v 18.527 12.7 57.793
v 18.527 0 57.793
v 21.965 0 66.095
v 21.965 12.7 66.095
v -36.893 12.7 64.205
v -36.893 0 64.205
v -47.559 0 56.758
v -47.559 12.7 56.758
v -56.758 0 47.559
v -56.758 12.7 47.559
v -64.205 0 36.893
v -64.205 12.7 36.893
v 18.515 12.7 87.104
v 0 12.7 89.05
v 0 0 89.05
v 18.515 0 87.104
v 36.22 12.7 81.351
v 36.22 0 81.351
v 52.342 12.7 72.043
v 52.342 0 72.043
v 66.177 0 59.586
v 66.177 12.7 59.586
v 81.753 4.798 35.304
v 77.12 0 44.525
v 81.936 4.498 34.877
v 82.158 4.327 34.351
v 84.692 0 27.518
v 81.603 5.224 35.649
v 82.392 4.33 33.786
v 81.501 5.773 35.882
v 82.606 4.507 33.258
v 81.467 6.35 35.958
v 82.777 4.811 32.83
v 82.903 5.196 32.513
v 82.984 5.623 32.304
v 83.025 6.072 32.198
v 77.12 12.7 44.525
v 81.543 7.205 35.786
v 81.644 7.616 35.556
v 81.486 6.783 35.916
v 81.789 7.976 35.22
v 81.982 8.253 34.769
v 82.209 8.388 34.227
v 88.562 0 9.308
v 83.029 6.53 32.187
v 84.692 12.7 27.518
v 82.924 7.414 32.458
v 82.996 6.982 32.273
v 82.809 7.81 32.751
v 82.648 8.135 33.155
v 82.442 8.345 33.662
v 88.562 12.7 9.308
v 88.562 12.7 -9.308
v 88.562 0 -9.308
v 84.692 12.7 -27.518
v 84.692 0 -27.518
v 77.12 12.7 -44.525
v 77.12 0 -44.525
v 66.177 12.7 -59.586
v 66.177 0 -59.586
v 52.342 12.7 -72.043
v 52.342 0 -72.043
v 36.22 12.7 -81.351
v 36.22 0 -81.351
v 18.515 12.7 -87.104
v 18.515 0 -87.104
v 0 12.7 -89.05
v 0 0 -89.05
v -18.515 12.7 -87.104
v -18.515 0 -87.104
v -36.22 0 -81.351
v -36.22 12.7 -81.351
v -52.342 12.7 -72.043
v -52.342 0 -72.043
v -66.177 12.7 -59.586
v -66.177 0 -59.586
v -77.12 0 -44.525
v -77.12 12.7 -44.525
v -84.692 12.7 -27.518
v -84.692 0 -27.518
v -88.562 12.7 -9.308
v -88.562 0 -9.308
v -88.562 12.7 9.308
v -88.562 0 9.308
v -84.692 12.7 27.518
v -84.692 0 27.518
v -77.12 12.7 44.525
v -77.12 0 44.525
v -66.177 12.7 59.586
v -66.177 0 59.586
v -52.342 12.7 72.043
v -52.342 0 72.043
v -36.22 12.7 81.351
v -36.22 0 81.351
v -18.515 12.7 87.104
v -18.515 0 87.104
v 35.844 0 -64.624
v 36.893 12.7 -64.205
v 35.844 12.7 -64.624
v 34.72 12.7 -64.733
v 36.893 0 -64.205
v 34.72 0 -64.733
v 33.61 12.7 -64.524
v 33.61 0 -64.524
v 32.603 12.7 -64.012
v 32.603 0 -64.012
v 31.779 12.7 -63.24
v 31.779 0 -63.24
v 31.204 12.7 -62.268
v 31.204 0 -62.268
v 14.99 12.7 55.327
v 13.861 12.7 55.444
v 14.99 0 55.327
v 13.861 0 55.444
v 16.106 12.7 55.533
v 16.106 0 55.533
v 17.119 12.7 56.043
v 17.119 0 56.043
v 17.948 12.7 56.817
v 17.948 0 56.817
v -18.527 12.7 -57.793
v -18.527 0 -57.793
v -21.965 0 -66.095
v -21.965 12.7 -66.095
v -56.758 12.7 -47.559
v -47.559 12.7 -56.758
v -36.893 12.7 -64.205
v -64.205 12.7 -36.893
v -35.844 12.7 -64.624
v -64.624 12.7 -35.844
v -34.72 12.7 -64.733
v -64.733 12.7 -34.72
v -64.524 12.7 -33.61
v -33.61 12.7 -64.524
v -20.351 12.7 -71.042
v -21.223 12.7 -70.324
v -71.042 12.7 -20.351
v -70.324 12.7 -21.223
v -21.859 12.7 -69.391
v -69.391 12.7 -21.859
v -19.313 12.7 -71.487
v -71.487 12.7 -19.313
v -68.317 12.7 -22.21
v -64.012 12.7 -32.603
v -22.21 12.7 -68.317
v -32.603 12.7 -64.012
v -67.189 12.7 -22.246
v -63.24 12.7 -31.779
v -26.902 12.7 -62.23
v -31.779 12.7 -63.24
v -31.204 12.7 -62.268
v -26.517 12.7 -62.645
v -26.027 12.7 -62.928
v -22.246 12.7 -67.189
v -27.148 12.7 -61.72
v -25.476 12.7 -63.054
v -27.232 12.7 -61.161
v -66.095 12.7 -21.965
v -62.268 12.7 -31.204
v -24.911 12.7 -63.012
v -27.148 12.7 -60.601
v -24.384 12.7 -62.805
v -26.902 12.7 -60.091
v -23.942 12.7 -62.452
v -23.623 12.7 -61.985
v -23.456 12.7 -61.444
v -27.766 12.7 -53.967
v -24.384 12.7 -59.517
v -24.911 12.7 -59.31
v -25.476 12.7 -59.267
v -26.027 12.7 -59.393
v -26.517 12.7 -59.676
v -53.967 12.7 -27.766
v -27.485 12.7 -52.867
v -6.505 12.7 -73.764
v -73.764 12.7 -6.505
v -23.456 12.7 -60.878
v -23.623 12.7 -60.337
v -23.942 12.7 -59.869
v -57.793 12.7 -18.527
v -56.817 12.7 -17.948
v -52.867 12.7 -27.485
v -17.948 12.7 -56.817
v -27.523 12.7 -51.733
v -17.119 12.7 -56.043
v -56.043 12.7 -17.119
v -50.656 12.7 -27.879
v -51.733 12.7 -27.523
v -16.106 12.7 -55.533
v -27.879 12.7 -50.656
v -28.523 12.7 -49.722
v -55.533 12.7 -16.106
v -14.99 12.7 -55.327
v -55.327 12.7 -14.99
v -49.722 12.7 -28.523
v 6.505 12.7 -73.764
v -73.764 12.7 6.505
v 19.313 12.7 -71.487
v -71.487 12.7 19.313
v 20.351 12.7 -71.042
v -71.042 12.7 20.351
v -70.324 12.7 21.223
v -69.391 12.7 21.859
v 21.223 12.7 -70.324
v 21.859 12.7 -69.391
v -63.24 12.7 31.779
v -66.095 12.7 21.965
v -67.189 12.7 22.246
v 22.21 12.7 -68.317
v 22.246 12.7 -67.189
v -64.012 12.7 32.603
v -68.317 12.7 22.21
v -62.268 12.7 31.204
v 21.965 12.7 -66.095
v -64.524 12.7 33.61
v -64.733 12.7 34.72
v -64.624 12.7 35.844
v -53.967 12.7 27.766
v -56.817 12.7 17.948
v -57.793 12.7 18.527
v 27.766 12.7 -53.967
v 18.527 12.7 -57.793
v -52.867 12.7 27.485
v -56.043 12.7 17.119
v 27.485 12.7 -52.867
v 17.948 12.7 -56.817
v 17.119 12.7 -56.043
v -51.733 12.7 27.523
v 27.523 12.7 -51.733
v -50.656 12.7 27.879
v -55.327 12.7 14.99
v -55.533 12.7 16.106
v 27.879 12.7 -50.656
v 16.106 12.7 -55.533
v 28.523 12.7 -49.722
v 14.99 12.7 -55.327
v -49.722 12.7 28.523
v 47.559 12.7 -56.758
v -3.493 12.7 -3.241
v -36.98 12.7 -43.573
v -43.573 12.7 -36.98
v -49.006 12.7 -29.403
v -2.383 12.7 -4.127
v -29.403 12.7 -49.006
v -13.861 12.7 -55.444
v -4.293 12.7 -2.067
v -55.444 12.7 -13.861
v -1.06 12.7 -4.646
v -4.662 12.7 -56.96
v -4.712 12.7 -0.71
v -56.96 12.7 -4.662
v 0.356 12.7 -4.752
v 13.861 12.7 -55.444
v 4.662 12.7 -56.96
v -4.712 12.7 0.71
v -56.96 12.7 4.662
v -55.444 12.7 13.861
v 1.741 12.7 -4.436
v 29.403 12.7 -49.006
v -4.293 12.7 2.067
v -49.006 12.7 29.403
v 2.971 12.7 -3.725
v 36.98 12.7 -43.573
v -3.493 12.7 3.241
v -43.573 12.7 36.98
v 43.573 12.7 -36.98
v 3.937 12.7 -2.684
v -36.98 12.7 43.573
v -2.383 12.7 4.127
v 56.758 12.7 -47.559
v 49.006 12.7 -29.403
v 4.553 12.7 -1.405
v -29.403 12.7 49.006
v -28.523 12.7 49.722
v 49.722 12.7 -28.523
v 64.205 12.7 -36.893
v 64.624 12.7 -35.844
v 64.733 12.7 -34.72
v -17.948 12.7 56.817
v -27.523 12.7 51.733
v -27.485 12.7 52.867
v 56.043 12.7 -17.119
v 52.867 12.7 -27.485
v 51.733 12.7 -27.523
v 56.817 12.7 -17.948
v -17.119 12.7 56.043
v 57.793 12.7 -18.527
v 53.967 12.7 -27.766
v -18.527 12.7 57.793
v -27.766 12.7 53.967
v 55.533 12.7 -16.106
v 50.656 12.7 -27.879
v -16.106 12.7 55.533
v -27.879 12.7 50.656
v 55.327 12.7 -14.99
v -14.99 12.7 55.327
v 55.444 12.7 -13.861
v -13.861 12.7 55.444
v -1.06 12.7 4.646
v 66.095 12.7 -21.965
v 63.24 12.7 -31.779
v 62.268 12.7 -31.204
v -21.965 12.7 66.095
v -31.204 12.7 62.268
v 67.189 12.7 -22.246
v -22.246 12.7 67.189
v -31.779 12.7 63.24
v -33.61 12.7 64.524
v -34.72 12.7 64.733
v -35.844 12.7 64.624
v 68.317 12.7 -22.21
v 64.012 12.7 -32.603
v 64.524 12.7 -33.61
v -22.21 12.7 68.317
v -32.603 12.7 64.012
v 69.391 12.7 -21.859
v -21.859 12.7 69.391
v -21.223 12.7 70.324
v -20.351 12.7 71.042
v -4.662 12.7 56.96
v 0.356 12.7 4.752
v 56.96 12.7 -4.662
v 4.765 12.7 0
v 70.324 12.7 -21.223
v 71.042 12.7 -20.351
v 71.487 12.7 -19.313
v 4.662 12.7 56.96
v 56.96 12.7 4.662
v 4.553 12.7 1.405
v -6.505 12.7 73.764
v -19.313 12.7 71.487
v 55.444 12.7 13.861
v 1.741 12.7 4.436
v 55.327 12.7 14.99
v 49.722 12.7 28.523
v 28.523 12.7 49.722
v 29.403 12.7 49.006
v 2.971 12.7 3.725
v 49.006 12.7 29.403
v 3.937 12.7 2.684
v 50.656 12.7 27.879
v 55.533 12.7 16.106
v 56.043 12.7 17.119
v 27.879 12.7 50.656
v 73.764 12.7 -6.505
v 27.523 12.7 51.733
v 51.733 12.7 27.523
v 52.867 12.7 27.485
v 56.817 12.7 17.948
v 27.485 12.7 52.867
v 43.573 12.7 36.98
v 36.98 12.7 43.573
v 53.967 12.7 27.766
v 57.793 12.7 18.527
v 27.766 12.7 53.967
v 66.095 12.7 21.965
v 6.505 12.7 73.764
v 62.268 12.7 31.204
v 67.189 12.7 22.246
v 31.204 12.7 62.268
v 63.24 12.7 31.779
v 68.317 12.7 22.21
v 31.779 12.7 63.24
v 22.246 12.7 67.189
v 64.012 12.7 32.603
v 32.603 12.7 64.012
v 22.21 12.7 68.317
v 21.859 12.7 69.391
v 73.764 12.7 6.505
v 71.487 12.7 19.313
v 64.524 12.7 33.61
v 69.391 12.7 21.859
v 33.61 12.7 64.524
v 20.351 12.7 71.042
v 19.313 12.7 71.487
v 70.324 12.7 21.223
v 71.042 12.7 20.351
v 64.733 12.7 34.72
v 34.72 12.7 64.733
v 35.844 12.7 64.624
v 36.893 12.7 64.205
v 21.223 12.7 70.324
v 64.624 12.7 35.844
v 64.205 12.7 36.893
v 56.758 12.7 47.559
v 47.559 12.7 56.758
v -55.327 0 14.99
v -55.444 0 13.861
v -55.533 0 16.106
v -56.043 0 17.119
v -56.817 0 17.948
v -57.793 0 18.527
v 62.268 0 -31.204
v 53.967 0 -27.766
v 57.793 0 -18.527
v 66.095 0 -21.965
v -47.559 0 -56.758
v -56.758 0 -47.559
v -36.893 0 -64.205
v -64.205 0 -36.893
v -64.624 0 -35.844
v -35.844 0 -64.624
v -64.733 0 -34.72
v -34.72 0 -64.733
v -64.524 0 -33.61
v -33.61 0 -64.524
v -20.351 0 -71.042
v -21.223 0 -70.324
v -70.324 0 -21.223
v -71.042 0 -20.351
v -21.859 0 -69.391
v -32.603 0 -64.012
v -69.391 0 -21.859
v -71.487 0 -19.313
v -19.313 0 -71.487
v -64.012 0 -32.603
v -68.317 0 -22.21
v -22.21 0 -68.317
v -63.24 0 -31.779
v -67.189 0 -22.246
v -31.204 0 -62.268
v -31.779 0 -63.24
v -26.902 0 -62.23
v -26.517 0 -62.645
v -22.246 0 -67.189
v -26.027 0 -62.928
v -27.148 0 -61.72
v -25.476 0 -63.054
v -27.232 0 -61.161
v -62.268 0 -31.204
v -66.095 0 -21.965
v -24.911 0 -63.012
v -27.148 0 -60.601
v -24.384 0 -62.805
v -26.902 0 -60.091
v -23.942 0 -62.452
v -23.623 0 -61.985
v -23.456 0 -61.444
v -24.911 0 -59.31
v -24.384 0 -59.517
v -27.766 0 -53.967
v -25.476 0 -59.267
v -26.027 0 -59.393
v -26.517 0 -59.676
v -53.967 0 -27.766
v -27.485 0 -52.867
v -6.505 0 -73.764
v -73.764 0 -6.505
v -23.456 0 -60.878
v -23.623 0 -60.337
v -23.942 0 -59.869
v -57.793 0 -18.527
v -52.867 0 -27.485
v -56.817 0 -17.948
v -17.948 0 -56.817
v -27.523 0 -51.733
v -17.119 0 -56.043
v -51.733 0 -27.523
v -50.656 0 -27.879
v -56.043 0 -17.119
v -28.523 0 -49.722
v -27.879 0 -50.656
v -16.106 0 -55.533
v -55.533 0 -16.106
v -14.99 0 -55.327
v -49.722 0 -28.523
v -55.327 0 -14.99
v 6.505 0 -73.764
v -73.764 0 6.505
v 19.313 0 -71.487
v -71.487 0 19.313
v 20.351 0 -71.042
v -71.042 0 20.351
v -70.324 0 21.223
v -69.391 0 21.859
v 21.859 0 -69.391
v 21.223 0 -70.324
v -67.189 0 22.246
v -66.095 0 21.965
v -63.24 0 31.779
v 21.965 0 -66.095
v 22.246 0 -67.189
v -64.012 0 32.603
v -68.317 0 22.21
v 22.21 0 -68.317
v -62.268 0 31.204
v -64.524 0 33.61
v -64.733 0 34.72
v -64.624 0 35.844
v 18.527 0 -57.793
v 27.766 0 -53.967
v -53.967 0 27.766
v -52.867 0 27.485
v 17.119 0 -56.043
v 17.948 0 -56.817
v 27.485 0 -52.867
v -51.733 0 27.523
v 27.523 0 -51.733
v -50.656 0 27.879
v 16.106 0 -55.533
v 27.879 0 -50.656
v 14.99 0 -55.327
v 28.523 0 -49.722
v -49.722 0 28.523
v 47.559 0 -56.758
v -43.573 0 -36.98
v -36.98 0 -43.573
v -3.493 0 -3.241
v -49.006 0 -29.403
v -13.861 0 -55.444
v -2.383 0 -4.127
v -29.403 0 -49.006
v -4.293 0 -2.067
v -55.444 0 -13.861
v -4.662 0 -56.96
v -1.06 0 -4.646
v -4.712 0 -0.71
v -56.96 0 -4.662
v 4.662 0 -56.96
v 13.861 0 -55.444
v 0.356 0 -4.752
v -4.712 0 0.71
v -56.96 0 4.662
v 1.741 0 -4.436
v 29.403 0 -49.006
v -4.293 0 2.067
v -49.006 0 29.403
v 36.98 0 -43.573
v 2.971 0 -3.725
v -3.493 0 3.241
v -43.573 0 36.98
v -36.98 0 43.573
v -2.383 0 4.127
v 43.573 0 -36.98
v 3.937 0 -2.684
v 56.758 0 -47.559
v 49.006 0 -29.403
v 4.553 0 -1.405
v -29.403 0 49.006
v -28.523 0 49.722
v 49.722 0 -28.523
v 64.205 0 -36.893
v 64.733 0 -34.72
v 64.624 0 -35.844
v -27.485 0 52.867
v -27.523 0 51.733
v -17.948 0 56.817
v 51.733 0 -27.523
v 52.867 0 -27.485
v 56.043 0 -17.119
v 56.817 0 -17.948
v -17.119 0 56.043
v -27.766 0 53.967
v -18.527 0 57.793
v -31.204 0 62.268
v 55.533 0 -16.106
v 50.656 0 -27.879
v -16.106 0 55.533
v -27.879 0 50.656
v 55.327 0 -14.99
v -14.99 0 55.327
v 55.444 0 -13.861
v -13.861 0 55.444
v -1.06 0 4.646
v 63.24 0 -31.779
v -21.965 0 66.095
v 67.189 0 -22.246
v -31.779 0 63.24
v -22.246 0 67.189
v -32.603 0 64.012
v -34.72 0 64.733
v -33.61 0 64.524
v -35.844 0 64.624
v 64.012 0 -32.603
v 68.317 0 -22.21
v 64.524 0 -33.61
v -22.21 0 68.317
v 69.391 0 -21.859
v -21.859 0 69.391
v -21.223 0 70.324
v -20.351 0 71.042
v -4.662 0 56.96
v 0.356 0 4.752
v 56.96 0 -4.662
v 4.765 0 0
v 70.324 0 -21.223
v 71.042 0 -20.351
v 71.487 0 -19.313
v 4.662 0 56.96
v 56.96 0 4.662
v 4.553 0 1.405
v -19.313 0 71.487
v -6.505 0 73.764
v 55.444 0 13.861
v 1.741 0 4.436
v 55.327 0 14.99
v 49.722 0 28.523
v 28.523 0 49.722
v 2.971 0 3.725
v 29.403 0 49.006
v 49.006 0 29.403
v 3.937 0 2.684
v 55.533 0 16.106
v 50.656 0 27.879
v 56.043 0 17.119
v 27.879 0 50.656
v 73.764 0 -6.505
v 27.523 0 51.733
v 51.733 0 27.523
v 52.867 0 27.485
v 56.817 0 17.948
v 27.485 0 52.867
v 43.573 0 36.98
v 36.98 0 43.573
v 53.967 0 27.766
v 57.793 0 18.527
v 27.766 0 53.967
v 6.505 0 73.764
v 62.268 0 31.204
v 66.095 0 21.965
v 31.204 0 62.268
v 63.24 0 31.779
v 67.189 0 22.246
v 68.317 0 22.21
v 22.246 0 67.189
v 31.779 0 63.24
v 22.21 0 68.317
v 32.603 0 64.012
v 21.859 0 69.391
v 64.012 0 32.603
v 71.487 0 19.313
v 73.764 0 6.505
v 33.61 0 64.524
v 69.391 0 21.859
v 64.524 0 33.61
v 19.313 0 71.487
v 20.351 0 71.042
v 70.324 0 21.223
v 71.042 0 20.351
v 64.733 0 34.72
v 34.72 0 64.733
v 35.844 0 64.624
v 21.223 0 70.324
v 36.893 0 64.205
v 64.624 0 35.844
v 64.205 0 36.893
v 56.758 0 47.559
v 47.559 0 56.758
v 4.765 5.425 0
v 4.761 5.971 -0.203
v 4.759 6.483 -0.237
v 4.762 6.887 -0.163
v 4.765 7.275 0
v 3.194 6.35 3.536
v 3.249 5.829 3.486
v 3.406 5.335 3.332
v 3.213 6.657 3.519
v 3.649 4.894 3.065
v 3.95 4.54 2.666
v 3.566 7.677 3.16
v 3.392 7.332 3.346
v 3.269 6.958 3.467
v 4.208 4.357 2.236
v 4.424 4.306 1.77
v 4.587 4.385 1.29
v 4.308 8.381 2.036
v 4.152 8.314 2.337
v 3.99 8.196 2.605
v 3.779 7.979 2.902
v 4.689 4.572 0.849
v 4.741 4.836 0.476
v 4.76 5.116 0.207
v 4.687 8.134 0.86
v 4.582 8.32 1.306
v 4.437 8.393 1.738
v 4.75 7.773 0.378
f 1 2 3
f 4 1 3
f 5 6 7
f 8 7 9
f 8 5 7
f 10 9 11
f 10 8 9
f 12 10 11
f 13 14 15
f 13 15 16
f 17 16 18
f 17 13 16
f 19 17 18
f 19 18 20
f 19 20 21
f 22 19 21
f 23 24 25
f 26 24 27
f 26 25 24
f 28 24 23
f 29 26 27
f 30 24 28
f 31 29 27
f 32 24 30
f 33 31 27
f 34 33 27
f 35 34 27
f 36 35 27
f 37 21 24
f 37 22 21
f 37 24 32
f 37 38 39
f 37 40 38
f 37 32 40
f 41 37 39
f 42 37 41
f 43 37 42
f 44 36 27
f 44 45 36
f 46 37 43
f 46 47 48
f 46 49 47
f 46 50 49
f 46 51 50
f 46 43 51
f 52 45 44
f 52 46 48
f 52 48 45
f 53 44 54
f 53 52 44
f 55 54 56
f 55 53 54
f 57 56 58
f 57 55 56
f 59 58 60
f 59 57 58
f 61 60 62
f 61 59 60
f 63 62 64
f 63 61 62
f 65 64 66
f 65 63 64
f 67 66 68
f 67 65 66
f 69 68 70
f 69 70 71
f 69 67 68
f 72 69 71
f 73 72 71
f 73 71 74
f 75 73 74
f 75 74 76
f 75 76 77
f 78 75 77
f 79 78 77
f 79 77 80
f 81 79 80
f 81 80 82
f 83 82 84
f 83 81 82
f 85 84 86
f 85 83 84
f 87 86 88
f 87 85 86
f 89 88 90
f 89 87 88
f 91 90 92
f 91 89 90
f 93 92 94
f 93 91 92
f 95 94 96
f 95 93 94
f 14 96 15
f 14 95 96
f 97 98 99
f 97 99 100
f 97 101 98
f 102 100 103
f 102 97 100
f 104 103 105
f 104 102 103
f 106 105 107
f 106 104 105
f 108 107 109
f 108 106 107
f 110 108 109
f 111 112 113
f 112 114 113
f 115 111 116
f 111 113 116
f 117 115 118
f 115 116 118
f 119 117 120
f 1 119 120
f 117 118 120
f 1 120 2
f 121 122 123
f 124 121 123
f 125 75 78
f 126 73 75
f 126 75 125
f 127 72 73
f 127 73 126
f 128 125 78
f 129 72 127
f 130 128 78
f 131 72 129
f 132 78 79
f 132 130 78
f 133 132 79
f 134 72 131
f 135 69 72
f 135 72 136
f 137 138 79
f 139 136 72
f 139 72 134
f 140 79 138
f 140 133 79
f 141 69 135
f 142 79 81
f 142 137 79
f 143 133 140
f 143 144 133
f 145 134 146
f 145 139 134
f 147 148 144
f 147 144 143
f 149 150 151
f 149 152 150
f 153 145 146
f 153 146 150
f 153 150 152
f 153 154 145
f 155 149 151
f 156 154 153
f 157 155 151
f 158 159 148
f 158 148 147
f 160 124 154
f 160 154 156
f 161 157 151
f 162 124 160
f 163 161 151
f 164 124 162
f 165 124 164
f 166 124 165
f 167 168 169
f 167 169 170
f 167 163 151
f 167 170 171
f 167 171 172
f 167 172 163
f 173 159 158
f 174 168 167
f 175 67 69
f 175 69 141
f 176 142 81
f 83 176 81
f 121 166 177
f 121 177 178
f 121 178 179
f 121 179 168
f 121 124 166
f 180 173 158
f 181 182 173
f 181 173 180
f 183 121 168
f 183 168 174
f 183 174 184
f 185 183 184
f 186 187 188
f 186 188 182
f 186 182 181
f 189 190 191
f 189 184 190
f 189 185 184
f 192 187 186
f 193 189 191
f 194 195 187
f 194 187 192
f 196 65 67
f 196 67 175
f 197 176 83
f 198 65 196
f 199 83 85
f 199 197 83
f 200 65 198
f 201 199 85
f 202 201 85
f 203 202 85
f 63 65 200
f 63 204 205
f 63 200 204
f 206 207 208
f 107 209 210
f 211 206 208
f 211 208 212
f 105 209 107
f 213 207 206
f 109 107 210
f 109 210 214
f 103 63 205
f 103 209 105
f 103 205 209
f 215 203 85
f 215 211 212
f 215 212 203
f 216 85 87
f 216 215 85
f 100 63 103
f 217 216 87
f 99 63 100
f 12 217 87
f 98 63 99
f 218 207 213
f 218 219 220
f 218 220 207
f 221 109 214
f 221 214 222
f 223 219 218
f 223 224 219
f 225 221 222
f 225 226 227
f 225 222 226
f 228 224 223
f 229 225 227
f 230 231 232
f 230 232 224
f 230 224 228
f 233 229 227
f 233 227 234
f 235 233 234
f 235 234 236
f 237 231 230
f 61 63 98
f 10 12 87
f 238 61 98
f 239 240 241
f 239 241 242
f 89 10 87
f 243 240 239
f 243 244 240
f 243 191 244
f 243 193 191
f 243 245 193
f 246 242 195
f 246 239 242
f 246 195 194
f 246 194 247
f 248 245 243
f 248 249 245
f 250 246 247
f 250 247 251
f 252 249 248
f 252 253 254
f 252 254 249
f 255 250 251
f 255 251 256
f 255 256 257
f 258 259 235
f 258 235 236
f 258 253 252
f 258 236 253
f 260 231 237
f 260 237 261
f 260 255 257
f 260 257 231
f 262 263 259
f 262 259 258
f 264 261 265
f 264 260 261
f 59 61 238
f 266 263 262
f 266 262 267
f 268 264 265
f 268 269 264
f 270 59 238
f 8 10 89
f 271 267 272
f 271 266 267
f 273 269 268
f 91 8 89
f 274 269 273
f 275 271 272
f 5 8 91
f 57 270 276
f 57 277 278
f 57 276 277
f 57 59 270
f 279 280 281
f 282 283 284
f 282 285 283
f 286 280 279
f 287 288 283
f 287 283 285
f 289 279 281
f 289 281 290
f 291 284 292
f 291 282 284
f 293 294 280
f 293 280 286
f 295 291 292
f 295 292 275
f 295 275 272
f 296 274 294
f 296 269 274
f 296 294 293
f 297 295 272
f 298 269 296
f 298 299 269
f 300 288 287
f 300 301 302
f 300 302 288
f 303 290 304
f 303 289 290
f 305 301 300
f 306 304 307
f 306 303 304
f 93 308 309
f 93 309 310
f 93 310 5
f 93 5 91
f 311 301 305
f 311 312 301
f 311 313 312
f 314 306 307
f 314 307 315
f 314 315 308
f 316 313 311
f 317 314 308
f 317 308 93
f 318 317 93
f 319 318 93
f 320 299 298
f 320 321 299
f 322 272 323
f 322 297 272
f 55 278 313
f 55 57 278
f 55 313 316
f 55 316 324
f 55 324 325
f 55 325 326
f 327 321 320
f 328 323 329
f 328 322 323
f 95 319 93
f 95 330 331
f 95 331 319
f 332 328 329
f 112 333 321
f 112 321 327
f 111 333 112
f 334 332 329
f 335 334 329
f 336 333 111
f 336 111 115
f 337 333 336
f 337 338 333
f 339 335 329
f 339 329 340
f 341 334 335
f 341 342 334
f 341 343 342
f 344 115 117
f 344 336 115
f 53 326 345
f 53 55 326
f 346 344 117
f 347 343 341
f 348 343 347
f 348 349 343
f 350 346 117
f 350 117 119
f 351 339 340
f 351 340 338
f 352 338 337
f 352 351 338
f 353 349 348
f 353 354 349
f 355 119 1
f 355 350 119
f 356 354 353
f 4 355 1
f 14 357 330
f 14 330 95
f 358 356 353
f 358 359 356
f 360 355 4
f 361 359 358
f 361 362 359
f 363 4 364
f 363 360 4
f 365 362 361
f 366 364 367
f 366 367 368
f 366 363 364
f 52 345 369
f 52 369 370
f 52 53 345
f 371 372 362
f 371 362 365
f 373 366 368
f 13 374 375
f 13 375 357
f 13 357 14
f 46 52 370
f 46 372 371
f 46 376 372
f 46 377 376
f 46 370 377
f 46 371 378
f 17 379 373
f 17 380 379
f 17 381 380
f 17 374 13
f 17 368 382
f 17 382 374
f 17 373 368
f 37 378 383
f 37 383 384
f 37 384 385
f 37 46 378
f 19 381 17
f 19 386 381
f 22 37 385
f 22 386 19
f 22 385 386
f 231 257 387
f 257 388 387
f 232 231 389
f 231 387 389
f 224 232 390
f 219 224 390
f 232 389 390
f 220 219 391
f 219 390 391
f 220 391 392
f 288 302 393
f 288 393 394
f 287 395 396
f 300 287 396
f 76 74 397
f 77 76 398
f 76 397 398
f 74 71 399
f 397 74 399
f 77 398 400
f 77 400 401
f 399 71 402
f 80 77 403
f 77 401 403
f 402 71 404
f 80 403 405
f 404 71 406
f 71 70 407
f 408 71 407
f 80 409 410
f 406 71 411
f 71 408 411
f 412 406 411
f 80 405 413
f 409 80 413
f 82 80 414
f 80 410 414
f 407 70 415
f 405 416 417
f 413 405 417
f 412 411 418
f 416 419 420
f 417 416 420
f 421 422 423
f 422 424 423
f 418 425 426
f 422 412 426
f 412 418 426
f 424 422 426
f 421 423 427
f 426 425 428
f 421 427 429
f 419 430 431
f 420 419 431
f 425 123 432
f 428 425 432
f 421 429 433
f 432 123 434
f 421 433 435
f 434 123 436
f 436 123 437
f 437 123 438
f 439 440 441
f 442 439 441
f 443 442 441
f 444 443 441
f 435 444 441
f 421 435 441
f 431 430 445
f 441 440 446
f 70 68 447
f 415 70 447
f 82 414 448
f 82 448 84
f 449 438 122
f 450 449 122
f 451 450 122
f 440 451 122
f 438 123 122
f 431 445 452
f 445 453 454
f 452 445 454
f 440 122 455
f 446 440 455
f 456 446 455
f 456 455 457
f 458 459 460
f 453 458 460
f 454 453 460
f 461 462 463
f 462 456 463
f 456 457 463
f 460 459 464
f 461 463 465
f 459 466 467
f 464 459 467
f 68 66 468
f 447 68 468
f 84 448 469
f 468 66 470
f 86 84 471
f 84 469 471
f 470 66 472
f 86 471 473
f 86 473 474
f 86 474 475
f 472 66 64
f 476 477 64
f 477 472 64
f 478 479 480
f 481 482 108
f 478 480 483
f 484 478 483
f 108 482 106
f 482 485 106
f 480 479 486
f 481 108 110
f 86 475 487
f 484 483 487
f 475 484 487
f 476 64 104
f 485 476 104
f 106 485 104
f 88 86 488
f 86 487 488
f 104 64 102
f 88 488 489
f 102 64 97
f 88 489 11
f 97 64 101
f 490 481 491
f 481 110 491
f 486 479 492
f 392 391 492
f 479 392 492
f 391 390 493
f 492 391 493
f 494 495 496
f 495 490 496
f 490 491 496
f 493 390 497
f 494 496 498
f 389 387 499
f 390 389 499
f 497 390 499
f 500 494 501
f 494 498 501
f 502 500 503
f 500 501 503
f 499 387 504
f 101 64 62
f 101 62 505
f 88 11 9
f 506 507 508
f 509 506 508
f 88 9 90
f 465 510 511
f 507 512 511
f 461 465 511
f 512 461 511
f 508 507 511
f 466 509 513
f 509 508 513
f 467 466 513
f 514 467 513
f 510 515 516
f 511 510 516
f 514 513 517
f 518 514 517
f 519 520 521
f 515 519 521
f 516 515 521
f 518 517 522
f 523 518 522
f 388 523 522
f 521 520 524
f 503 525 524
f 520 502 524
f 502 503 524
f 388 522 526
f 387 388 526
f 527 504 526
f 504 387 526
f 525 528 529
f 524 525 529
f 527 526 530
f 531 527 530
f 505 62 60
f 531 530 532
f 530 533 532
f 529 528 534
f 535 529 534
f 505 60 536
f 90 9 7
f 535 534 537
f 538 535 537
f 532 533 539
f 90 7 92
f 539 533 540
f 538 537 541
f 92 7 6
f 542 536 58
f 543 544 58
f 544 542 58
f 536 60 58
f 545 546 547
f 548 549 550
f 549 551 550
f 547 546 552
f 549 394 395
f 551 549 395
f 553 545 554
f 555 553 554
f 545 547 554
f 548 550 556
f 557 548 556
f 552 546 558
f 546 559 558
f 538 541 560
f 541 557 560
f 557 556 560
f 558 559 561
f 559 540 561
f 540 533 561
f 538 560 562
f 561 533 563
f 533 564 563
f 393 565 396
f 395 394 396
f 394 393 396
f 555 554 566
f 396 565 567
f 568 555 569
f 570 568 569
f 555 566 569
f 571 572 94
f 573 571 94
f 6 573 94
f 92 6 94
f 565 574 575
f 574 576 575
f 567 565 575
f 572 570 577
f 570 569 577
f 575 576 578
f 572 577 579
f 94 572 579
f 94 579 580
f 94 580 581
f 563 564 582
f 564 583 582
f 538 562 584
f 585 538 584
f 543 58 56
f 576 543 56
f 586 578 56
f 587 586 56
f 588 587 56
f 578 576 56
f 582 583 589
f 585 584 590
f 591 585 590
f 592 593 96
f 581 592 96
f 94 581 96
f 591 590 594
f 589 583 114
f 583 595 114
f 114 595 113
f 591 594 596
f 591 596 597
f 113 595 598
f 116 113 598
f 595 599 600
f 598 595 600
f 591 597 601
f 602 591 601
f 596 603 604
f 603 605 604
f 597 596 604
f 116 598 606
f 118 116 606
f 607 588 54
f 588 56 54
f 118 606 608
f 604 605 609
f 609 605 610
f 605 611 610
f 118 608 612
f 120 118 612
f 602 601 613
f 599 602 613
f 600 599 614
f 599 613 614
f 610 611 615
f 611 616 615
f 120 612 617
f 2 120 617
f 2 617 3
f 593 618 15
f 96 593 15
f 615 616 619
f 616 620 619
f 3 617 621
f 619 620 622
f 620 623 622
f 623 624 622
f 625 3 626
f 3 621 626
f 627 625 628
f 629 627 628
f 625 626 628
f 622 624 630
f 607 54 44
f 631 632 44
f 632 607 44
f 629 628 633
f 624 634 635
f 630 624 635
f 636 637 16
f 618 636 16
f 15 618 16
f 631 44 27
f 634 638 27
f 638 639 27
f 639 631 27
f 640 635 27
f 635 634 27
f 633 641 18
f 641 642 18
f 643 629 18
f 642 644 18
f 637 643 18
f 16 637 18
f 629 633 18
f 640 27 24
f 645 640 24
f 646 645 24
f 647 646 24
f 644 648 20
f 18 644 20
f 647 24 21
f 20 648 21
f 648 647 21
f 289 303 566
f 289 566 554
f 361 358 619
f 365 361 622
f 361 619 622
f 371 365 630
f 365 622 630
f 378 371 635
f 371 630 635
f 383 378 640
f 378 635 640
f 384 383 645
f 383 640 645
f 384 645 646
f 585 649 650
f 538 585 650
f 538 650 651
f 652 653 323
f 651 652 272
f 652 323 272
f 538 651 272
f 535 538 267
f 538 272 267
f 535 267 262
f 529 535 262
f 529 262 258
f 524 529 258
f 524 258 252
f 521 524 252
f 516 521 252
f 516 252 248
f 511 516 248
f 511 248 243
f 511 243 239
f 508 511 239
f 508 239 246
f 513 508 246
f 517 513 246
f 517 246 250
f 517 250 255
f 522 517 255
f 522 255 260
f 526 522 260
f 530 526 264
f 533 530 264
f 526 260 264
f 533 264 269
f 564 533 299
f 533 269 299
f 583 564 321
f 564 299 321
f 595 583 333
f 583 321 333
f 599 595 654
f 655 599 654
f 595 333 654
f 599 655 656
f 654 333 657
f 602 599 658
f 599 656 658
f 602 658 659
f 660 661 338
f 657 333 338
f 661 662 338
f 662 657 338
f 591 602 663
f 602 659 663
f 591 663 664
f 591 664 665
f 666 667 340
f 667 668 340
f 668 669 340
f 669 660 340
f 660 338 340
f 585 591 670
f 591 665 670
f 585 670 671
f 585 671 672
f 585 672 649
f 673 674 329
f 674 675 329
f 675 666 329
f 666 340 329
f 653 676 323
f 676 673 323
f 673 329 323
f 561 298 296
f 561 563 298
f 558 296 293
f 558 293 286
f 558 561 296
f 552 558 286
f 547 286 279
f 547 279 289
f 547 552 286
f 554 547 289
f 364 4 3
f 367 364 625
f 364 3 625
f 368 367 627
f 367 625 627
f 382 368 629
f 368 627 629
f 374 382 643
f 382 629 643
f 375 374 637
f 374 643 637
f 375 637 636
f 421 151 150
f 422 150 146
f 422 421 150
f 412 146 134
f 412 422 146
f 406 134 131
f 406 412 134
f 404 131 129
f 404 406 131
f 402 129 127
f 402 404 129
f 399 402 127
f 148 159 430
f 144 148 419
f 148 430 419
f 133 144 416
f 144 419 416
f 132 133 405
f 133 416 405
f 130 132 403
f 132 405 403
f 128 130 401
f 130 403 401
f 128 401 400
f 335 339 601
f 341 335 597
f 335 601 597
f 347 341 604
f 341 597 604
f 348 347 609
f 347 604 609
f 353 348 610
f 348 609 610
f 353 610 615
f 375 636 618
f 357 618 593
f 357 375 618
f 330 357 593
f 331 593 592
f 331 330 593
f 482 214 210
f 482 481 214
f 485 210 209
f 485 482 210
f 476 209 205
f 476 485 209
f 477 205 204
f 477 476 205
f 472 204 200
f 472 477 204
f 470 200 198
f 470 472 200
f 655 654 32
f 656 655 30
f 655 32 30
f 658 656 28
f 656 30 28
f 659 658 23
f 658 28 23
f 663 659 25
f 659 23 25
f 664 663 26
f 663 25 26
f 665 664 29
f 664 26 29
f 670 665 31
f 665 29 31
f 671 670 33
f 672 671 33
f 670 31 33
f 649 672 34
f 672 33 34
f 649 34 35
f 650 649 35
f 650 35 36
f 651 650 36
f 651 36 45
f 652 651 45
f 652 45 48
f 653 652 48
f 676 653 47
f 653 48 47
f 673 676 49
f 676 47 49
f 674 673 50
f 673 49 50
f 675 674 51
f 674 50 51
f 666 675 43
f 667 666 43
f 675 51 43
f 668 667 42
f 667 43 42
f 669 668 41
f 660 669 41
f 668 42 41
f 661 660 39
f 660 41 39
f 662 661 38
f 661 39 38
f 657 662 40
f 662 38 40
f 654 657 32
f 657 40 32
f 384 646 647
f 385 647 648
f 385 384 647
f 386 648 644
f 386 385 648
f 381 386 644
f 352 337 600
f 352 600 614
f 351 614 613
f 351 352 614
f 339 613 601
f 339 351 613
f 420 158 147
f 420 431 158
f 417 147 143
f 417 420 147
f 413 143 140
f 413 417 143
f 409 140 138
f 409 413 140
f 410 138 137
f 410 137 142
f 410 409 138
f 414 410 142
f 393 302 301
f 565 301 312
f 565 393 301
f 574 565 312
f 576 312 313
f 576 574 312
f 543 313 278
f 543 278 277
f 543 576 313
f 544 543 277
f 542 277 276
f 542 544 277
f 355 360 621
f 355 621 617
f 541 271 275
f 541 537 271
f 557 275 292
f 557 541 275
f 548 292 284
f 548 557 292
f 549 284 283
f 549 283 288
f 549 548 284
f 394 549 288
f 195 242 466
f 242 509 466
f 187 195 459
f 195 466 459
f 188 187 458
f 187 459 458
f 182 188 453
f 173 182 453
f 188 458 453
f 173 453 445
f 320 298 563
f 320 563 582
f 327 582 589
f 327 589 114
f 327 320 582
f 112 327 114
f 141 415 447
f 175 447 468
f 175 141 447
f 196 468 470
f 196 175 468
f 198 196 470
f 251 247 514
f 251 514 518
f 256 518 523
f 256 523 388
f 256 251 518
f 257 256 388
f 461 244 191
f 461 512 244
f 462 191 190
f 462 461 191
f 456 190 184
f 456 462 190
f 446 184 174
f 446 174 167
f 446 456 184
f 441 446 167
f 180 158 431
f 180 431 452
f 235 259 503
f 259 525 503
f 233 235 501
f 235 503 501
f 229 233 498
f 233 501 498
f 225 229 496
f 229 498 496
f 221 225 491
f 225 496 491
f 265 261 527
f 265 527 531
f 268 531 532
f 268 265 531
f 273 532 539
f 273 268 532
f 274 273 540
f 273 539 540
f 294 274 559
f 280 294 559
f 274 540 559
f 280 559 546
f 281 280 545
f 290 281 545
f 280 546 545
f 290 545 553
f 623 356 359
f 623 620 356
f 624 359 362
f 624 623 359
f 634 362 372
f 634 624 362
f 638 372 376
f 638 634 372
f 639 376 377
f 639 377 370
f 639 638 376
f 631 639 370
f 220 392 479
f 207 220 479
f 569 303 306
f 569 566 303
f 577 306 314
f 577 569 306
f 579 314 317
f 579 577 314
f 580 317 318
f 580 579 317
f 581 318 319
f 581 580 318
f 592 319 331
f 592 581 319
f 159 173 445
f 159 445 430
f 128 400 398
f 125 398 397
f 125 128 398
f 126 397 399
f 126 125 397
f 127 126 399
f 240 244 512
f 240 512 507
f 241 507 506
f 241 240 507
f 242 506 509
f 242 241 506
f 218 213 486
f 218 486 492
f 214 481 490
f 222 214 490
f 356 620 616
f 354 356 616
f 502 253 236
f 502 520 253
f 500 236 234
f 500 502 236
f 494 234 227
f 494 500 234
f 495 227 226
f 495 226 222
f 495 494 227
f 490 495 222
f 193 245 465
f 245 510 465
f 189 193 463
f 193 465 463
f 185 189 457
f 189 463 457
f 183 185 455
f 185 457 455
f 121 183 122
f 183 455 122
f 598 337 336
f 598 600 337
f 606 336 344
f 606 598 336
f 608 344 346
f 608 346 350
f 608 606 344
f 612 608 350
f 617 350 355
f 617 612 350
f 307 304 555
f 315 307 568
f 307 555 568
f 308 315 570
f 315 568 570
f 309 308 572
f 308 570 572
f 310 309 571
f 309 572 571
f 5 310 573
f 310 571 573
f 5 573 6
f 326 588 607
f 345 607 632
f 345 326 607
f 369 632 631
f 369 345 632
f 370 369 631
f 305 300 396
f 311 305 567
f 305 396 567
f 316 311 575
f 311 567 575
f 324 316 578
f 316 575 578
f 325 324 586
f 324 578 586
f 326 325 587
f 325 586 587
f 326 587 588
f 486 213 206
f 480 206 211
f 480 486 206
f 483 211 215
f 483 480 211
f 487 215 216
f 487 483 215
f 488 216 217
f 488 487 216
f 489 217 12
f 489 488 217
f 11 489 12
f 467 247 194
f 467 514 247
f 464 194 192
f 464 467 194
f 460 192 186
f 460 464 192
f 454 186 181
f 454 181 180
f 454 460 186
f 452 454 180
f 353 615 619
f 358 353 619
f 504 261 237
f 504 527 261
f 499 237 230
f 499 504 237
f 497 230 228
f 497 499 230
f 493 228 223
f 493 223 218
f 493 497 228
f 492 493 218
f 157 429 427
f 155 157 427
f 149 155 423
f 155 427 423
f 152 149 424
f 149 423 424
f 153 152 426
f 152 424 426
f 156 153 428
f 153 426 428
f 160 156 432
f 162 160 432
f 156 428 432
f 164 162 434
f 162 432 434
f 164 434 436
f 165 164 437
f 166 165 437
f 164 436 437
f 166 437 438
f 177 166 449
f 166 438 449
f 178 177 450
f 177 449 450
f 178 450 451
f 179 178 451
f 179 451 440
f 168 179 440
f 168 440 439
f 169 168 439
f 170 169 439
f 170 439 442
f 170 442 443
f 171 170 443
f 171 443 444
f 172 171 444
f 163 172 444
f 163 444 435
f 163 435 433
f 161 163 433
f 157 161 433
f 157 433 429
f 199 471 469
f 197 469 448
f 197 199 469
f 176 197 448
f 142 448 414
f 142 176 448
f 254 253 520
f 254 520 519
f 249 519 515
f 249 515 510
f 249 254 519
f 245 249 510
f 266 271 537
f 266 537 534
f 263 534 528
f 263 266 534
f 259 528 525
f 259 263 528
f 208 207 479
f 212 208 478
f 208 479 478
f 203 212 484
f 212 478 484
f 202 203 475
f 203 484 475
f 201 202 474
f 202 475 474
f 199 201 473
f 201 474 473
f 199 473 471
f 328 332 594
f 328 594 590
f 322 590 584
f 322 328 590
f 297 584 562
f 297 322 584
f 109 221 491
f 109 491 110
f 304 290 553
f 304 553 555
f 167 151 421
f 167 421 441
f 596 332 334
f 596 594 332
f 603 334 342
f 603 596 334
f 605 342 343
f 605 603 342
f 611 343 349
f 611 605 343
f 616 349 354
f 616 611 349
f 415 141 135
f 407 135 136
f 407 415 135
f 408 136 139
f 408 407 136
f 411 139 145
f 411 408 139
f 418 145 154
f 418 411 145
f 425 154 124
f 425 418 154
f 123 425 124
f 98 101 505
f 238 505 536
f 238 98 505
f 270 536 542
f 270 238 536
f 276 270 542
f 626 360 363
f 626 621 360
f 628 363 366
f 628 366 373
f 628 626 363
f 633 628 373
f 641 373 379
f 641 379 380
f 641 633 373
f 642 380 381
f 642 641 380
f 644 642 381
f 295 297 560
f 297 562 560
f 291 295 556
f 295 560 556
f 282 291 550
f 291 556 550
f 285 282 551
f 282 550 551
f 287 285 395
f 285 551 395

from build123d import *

# Parameters (mm, degrees)
SKETCH2_W                = 89.05
SKETCH2_H                = 12.7
F_10_24_TAPPED_HOLE2_D   = 3.7973
CUT_EXTRUDE1_DEPTH       = 13.7
FILLET1_R                = 4
CIRPATTERN4_COUNT        = 8
FILLET1_OF_CIRPATTERN4_R = 4
SKETCH15_W               = 2.0447
SKETCH15_H               = 116.349432022
SKETCH22_R               = 4.765
CUT_EXTRUDE4_DEPTH       = 12.8


with BuildPart() as part:
    # Sketch2 → Revolve1 (revolve)
    with BuildSketch(Plane(origin=(0, 0, 0), x_dir=(0, 0, -1), z_dir=(1, 0, 0))):
        with Locations((-44.525, 6.35)):
            Rectangle(SKETCH2_W, SKETCH2_H)
    revolve(axis=Axis((0, -0.888756804, 0), (0, 1, 0)))

    # #10-24 Tapped Hole2 (through all)
    with Locations(Plane(origin=(0, 12.7, 0), x_dir=(1, 0, 0), z_dir=(0, 1, 0))):
        with Locations((-25.333643223, 61.160825052)):
            Hole(F_10_24_TAPPED_HOLE2_D / 2)

    # Sketch8 → Cut-Extrude1 (cut, through all)
    with BuildSketch(Plane(origin=(0, 12.7, 0), x_dir=(1, 0, 0), z_dir=(0, 1, 0))):
        with BuildLine():
            Line((-17.167098173, 54.510670885), (-23.653637882, 70.170563023))
            ThreePointArc((-23.653637882, 70.170563023), (0, 74.05), (23.653637882, 70.170563023))
            Line((23.653637882, 70.170563023), (17.167098173, 54.510670885))
            ThreePointArc((17.167098173, 54.510670885), (0, 57.15), (-17.167098173, 54.510670885))
        make_face()
    cut_extrude1 = extrude(amount=-CUT_EXTRUDE1_DEPTH, mode=Mode.SUBTRACT)

    # Fillet1
    fillet1_edges = [part.edges().sort_by_distance(p)[0] for p in [
        (17.167098173, 6.35, -54.510670885),
        (-17.167098173, 6.35, -54.510670885),
        (-23.653637882, 6.35, -70.170563023),
        (23.653637882, 6.35, -70.170563023),
    ]]
    fillet(fillet1_edges, radius=FILLET1_R)

    # CirPattern4: Cut-Extrude1 ×8 about axis
    cirpattern4_axis = Axis((0, 0, 0), (0, 1, 0))
    for i in range(1, CIRPATTERN4_COUNT):
        add(cut_extrude1.rotate(cirpattern4_axis, i * 360 / CIRPATTERN4_COUNT), mode=Mode.SUBTRACT)

    # Fillet1 of CirPattern4
    fillet1_of_cirpattern4_edges = [part.edges().sort_by_distance(p)[0] for p in [
        (-26.405893498, 6.35, -50.683836561),
        (-50.683836561, 6.35, -26.405893498),
        (-66.343728699, 6.35, -32.892433207),
        (-32.892433207, 6.35, -66.343728699),
        (-54.510670885, 6.35, -17.167098173),
        (-54.510670885, 6.35, 17.167098173),
        (-70.170563023, 6.35, 23.653637882),
        (-70.170563023, 6.35, -23.653637882),
        (-50.683836561, 6.35, 26.405893498),
        (-26.405893498, 6.35, 50.683836561),
        (-32.892433207, 6.35, 66.343728699),
        (-66.343728699, 6.35, 32.892433207),
        (-17.167098173, 6.35, 54.510670885),
        (17.167098173, 6.35, 54.510670885),
        (23.653637882, 6.35, 70.170563023),
        (-23.653637882, 6.35, 70.170563023),
        (26.405893498, 6.35, 50.683836561),
        (50.683836561, 6.35, 26.405893498),
        (66.343728699, 6.35, 32.892433207),
        (32.892433207, 6.35, 66.343728699),
        (54.510670885, 6.35, 17.167098173),
        (54.510670885, 6.35, -17.167098173),
        (70.170563023, 6.35, -23.653637882),
        (70.170563023, 6.35, 23.653637882),
        (50.683836561, 6.35, -26.405893498),
        (26.405893498, 6.35, -50.683836561),
        (32.892433207, 6.35, -66.343728699),
        (66.343728699, 6.35, -32.892433207),
    ]]
    fillet(fillet1_of_cirpattern4_edges, radius=FILLET1_OF_CIRPATTERN4_R)

    # Sketch15 → #20 (0.161) Diameter Hole1 (revolve, cut)
    with BuildSketch(Plane(origin=(0, 6.35, 0), x_dir=(-0.382683432, 0, 0.923879533), z_dir=(0, 1, 0))):
        with Locations((1.02235, 58.174716011)):
            Rectangle(SKETCH15_W, SKETCH15_H)
    revolve(axis=Axis((-5.866635031, 6.35, -2.430039796), (0.923879533, 0, 0.382683432)), mode=Mode.SUBTRACT)

    # Sketch22 → Cut-Extrude4 (cut)
    with BuildSketch(Plane(origin=(0, 12.7, 0), x_dir=(1, 0, 0), z_dir=(0, 1, 0))):
        Circle(SKETCH22_R)
    extrude(amount=-CUT_EXTRUDE4_DEPTH, mode=Mode.SUBTRACT)


solid = part.part
